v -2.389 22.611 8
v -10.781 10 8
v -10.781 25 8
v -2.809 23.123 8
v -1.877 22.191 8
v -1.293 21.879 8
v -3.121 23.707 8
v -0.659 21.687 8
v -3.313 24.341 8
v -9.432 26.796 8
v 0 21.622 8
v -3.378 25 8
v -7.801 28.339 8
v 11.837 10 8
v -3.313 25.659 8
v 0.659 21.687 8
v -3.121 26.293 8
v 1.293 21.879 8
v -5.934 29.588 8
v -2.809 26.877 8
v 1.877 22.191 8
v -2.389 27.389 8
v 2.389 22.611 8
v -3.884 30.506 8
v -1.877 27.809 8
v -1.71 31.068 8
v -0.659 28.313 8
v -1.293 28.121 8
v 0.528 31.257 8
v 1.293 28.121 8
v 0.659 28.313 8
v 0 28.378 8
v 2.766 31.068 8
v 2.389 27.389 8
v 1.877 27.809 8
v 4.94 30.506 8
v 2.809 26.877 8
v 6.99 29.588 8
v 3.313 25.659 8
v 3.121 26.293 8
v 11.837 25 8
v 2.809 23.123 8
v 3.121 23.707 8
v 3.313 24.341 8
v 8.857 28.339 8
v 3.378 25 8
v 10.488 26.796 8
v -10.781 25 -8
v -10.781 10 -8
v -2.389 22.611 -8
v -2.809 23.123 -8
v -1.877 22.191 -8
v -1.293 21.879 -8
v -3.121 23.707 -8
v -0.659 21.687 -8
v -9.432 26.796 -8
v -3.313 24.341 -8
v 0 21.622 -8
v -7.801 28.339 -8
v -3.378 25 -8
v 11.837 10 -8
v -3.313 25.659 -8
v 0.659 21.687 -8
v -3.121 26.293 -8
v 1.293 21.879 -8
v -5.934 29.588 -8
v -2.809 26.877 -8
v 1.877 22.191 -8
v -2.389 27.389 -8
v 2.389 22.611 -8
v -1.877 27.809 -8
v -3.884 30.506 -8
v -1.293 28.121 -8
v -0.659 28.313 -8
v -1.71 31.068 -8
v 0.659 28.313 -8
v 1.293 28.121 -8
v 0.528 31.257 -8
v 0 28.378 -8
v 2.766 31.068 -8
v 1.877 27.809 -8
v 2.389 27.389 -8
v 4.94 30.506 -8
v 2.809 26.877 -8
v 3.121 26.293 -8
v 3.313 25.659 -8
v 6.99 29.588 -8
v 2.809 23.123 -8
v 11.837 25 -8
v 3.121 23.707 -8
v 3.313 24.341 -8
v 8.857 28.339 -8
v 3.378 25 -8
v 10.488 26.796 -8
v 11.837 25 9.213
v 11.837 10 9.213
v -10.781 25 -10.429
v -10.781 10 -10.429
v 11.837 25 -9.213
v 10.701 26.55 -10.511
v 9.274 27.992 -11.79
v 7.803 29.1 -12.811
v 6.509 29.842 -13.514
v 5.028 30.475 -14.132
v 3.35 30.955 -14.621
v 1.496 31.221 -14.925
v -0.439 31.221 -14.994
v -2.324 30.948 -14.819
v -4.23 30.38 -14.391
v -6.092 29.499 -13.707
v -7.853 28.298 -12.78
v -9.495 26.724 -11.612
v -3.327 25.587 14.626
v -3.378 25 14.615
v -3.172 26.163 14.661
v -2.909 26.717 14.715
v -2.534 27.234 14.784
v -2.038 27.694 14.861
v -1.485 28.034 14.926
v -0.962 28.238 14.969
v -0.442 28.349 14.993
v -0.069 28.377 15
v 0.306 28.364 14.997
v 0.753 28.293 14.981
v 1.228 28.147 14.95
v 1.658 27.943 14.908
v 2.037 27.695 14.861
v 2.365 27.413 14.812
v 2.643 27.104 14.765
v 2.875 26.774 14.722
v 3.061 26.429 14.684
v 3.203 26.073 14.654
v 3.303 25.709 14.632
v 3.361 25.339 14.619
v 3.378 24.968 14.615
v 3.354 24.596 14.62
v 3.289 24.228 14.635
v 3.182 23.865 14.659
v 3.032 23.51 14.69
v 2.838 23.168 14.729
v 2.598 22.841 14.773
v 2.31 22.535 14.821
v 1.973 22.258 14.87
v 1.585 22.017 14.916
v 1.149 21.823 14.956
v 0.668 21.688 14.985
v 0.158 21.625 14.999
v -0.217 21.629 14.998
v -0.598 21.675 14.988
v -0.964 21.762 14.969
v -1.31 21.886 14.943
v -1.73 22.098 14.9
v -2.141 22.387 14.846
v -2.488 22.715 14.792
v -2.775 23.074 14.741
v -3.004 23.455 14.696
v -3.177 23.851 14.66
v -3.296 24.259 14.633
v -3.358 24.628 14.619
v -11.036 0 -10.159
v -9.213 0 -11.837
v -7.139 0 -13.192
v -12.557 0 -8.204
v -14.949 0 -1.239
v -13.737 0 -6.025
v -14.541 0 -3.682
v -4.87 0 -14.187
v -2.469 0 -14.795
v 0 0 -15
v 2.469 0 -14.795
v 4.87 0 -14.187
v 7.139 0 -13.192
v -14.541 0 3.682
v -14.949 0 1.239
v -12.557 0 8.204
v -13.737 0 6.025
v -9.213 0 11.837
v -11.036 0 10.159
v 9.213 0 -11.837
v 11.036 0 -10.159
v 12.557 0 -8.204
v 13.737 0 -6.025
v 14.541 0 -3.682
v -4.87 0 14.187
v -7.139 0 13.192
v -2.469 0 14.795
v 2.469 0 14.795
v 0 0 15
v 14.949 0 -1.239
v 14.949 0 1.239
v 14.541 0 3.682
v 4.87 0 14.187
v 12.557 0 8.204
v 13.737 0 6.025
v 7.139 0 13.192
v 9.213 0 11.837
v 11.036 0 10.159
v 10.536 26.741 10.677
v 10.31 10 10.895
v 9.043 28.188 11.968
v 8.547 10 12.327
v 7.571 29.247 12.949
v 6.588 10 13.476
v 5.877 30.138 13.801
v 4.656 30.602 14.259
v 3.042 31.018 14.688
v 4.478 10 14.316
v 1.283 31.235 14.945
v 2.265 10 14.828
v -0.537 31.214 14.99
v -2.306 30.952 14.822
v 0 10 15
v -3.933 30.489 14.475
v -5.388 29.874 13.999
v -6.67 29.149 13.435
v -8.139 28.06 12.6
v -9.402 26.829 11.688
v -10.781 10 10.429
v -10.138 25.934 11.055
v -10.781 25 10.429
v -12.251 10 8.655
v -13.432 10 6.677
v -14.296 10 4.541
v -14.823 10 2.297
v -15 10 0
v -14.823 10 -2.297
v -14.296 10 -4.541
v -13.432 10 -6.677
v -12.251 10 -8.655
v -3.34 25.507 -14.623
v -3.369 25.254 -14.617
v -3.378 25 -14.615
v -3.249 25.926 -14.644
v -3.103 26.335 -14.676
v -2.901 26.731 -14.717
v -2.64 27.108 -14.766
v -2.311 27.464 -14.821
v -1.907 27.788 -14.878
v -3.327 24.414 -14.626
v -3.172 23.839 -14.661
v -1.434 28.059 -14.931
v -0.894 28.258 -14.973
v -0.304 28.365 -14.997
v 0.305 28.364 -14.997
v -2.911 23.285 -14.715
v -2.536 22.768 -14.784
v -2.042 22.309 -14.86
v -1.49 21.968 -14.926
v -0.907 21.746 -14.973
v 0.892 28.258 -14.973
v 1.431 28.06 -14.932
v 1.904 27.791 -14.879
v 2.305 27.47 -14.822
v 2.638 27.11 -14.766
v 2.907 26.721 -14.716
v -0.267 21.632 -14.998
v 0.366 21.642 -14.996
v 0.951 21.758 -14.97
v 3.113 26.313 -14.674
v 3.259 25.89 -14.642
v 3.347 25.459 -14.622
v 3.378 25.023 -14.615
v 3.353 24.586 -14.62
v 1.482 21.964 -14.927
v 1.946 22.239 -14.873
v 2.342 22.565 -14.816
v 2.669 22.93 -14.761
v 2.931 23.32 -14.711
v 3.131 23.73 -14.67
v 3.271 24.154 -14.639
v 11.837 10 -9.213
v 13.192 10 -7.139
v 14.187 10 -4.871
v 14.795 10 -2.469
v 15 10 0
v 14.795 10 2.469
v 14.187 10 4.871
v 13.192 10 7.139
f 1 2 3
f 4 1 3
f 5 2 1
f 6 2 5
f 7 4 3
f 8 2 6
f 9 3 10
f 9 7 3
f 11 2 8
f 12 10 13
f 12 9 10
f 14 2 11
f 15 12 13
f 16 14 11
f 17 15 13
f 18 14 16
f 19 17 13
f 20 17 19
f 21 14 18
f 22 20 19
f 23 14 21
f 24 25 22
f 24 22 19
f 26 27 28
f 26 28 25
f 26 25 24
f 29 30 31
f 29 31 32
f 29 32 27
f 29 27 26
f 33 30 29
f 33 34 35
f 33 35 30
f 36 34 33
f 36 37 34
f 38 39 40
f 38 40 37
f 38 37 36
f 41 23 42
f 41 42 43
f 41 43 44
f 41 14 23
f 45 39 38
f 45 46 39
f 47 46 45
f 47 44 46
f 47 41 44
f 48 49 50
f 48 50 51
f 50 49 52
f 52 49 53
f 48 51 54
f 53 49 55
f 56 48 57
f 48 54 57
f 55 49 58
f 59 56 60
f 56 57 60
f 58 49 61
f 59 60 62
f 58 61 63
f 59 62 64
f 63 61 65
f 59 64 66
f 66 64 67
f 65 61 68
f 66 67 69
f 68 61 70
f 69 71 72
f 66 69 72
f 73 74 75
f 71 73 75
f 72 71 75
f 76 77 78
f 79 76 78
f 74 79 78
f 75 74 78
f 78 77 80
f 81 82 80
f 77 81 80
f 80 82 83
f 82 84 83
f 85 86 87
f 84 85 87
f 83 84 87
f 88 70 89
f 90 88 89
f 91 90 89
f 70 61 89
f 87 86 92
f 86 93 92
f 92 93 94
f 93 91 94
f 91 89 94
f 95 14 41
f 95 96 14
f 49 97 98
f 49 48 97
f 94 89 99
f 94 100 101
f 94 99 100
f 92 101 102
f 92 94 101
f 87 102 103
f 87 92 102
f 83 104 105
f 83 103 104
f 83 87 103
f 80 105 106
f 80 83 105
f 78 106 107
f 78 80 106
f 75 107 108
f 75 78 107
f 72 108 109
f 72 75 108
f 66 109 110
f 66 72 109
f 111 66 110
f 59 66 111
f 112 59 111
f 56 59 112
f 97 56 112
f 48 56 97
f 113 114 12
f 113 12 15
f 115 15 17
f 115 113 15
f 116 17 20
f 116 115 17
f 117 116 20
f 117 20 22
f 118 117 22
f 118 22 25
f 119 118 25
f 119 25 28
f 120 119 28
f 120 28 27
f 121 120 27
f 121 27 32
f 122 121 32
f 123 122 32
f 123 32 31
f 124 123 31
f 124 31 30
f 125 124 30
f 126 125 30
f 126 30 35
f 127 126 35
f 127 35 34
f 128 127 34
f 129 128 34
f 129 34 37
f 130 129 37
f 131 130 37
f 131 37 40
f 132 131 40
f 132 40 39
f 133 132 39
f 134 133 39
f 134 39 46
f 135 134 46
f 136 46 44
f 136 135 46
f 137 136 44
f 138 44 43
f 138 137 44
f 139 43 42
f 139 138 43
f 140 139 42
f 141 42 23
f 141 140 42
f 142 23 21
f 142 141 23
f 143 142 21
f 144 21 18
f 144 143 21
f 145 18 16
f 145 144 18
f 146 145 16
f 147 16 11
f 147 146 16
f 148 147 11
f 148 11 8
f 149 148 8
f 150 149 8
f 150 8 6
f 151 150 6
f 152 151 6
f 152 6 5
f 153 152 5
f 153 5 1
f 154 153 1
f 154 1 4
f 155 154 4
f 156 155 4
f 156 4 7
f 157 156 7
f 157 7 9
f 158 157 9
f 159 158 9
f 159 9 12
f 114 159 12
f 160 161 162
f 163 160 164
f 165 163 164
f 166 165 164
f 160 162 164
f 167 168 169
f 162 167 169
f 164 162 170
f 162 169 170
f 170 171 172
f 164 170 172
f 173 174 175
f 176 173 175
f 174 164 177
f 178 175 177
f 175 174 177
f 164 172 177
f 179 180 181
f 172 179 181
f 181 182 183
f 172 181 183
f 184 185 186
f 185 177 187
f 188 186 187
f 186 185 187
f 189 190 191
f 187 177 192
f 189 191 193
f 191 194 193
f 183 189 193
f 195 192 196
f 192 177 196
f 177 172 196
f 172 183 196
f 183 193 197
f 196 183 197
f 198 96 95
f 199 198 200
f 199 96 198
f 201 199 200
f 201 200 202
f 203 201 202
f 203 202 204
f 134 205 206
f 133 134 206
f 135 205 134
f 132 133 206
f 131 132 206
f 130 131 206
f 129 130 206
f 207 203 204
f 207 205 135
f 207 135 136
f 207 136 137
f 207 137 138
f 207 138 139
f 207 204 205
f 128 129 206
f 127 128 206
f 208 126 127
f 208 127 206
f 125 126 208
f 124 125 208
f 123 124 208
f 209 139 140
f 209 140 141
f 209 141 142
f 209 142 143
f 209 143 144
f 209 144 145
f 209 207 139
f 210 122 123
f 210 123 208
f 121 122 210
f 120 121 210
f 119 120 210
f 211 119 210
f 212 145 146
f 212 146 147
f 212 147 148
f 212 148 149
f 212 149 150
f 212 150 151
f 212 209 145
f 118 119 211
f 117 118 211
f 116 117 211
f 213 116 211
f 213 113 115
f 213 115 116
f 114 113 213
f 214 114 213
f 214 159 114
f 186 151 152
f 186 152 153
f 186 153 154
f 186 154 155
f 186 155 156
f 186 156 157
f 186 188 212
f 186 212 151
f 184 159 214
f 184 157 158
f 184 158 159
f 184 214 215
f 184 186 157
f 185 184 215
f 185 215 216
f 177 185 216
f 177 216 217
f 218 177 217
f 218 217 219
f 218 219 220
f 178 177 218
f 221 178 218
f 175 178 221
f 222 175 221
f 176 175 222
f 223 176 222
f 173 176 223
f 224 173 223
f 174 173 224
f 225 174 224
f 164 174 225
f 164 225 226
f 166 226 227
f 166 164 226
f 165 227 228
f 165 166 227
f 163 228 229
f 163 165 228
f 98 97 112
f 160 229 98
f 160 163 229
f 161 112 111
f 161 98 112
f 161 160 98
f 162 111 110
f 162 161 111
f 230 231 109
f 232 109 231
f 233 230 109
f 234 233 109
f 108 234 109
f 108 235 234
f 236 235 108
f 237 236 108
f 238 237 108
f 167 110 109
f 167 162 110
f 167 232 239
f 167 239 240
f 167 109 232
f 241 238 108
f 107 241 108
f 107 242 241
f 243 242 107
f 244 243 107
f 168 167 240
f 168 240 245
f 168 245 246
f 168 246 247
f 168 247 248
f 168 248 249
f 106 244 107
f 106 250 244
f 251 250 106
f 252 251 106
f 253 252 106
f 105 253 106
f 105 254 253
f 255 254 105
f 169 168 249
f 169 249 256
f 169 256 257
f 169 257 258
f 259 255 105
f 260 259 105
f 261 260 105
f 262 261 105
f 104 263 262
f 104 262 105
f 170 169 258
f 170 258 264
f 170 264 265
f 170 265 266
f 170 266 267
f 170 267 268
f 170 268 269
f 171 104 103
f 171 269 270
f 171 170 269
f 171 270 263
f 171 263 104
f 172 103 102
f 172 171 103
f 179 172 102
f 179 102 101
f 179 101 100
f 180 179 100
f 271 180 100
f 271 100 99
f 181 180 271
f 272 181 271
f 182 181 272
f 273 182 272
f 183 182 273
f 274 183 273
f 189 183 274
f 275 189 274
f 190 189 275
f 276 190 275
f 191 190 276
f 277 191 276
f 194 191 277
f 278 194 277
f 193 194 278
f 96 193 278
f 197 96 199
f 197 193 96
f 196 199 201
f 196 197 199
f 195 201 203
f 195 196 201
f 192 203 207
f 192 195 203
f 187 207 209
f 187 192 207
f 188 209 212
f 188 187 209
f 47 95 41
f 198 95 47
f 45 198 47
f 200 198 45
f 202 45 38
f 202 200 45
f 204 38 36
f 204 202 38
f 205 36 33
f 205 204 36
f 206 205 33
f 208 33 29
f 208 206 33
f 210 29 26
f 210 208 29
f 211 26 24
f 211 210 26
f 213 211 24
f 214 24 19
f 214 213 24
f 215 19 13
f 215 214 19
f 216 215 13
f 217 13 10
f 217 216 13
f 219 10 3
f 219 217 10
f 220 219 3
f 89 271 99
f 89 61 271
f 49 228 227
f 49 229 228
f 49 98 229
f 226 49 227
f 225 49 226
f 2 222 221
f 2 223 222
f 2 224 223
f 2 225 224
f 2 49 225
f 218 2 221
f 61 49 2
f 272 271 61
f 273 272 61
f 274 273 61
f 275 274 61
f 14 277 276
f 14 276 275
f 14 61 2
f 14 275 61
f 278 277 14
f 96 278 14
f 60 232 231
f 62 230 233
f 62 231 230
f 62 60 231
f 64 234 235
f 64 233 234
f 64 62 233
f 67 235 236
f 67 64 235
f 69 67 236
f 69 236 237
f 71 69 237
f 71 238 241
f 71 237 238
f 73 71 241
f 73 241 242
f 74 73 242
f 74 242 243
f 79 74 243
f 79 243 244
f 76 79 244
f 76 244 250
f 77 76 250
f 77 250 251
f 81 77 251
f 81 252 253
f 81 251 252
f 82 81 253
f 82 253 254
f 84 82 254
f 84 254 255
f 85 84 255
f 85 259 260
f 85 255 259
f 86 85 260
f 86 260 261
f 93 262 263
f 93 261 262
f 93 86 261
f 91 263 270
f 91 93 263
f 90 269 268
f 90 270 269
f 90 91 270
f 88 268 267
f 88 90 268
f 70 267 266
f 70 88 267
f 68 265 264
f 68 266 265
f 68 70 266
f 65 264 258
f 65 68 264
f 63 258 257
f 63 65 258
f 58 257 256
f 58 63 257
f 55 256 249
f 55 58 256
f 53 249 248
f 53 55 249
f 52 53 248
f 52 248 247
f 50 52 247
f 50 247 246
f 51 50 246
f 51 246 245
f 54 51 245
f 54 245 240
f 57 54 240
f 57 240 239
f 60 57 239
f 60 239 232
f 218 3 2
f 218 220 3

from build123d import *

# Parameters (mm, degrees)
SKETCH1_R                            = 15
BOSS_EXTRUDE1_DEPTH                  = 10
BOSS_EXTRUDE2_REACH                  = 25.452
BOSS_EXTRUDE2_END_RADIUS             = 15
BOSS_EXTRUDE2_DIRECTION_2_REACH      = 25.452
BOSS_EXTRUDE2_DIRECTION_2_END_RADIUS = 15
SKETCH3_W                            = 16
SKETCH3_H                            = 50
CUT_EXTRUDE1_DEPTH                   = 44.842776862
CUT_EXTRUDE2_DEPTH                   = 42.60493807
CUT_EXTRUDE2_DEPTH_BACK              = 42.60493807
SKETCH4_R                            = 3.3782


with BuildPart() as part:
    # Sketch1 → Boss-Extrude1 (new body)
    with BuildSketch(Plane(origin=(0, 0, 0), x_dir=(1, 0, 0), z_dir=(0, 1, 0))):
        with Locations(Location((0, 0, 0), (0, 0, 270))):
            Circle(SKETCH1_R)
    extrude(amount=BOSS_EXTRUDE1_DEPTH)

    # Boss-Extrude2: up to this cylinder (the profile starts inside it)
    boss_extrude2_end = Plane(origin=(0, 19.788333, 0), z_dir=(0, -1, 0)) * Cylinder(BOSS_EXTRUDE2_END_RADIUS, 81.904, mode=Mode.PRIVATE)
    # Sketch2 → Boss-Extrude2 (add, up to the surface)
    with BuildSketch(Plane.XY, mode=Mode.PRIVATE) as boss_extrude2_sk1:
        with BuildLine():
            Line((-10.780802974, 10), (11.836881633, 10))
            Line((11.836881633, 10), (11.836881633, 25))
            ThreePointArc((11.836881633, 25), (0.528039329, 31.256533044), (-10.780802974, 25))
            Line((-10.780802974, 25), (-10.780802974, 10))
        make_face()
    boss_extrude2_tool1 = extrude(boss_extrude2_sk1.sketch, amount=BOSS_EXTRUDE2_REACH, mode=Mode.PRIVATE) & boss_extrude2_end
    add(boss_extrude2_tool1.solids().sort_by_distance((0.528039, 19.788333, 0))[0])

    # Boss-Extrude2 direction 2: up to this cylinder (the profile starts inside it)
    boss_extrude2_direction_2_end = Plane(origin=(0, 19.788333, 0), z_dir=(0, -1, 0)) * Cylinder(BOSS_EXTRUDE2_DIRECTION_2_END_RADIUS, 81.904, mode=Mode.PRIVATE)
    # Sketch2 → Boss-Extrude2 direction 2 (add, up to the surface)
    with BuildSketch(Plane.XY, mode=Mode.PRIVATE) as boss_extrude2_direction_2_sk1:
        with BuildLine():
            Line((-10.780802974, 10), (11.836881633, 10))
            Line((11.836881633, 10), (11.836881633, 25))
            ThreePointArc((11.836881633, 25), (0.528039329, 31.256533044), (-10.780802974, 25))
            Line((-10.780802974, 25), (-10.780802974, 10))
        make_face()
    boss_extrude2_direction_2_tool1 = extrude(boss_extrude2_direction_2_sk1.sketch, amount=-BOSS_EXTRUDE2_DIRECTION_2_REACH, mode=Mode.PRIVATE) & boss_extrude2_direction_2_end
    add(boss_extrude2_direction_2_tool1.solids().sort_by_distance((0.528039, 19.788333, 0))[0])

    # Sketch3 → Cut-Extrude1 (cut, through all)
    with BuildSketch(Plane(origin=(11.836881633, 0, 0), x_dir=(0, 0, -1), z_dir=(1, 0, 0))):
        with Locations((0, 35)):
            Rectangle(SKETCH3_W, SKETCH3_H)
    extrude(amount=-CUT_EXTRUDE1_DEPTH, mode=Mode.SUBTRACT)

    # Sketch4 → Cut-Extrude2 (cut, two sides: drawn at the far end of the back side and taken through both)
    with BuildSketch(Plane(origin=(0, 0, 8), x_dir=(-1, 0, 0), z_dir=(0, 0, -1)).offset(-CUT_EXTRUDE2_DEPTH_BACK)):
        with Locations((0, 25)):
            Circle(SKETCH4_R)
    extrude(amount=CUT_EXTRUDE2_DEPTH + CUT_EXTRUDE2_DEPTH_BACK, mode=Mode.SUBTRACT)


solid = part.part
